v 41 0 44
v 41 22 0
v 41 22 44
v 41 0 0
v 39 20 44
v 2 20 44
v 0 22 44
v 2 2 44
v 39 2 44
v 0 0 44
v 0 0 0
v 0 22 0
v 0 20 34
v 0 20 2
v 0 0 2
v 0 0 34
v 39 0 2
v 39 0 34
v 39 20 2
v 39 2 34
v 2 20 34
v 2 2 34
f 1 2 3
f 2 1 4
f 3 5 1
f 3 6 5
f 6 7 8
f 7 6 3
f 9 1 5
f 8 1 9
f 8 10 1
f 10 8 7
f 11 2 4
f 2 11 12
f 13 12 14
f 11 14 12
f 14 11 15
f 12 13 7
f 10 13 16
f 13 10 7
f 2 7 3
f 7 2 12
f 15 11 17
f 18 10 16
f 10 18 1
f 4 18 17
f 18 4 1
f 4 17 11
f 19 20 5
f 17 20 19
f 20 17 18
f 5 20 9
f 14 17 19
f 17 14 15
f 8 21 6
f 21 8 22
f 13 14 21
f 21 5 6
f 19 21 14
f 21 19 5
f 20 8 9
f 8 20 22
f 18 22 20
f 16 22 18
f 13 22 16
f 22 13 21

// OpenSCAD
/* Project: light table
To hold wooden planks 35x17, to which led lights are mounted */

w=37; //width of 35x17 plank
d=18; //depth of 35x17 plank
h=32; //height of table top, here same as width of lower plank
t=2; //wall thickness in mm
g=10; //depth on which the plank is inserted
part="upper"; // [upper,lower]
if (part=="upper")
difference() {
cube([w+2*t,d+2*t,h+t+g]);
translate([t,t,t])cube([w,d,h+g]);
translate([0,0,t])cube([w+t,d+t,h]);
}
if (part=="lower")
difference() {
cube([w+2*t,d+2*t,h],center=true);
cube([w,d,h+0.02],center=true);
}
